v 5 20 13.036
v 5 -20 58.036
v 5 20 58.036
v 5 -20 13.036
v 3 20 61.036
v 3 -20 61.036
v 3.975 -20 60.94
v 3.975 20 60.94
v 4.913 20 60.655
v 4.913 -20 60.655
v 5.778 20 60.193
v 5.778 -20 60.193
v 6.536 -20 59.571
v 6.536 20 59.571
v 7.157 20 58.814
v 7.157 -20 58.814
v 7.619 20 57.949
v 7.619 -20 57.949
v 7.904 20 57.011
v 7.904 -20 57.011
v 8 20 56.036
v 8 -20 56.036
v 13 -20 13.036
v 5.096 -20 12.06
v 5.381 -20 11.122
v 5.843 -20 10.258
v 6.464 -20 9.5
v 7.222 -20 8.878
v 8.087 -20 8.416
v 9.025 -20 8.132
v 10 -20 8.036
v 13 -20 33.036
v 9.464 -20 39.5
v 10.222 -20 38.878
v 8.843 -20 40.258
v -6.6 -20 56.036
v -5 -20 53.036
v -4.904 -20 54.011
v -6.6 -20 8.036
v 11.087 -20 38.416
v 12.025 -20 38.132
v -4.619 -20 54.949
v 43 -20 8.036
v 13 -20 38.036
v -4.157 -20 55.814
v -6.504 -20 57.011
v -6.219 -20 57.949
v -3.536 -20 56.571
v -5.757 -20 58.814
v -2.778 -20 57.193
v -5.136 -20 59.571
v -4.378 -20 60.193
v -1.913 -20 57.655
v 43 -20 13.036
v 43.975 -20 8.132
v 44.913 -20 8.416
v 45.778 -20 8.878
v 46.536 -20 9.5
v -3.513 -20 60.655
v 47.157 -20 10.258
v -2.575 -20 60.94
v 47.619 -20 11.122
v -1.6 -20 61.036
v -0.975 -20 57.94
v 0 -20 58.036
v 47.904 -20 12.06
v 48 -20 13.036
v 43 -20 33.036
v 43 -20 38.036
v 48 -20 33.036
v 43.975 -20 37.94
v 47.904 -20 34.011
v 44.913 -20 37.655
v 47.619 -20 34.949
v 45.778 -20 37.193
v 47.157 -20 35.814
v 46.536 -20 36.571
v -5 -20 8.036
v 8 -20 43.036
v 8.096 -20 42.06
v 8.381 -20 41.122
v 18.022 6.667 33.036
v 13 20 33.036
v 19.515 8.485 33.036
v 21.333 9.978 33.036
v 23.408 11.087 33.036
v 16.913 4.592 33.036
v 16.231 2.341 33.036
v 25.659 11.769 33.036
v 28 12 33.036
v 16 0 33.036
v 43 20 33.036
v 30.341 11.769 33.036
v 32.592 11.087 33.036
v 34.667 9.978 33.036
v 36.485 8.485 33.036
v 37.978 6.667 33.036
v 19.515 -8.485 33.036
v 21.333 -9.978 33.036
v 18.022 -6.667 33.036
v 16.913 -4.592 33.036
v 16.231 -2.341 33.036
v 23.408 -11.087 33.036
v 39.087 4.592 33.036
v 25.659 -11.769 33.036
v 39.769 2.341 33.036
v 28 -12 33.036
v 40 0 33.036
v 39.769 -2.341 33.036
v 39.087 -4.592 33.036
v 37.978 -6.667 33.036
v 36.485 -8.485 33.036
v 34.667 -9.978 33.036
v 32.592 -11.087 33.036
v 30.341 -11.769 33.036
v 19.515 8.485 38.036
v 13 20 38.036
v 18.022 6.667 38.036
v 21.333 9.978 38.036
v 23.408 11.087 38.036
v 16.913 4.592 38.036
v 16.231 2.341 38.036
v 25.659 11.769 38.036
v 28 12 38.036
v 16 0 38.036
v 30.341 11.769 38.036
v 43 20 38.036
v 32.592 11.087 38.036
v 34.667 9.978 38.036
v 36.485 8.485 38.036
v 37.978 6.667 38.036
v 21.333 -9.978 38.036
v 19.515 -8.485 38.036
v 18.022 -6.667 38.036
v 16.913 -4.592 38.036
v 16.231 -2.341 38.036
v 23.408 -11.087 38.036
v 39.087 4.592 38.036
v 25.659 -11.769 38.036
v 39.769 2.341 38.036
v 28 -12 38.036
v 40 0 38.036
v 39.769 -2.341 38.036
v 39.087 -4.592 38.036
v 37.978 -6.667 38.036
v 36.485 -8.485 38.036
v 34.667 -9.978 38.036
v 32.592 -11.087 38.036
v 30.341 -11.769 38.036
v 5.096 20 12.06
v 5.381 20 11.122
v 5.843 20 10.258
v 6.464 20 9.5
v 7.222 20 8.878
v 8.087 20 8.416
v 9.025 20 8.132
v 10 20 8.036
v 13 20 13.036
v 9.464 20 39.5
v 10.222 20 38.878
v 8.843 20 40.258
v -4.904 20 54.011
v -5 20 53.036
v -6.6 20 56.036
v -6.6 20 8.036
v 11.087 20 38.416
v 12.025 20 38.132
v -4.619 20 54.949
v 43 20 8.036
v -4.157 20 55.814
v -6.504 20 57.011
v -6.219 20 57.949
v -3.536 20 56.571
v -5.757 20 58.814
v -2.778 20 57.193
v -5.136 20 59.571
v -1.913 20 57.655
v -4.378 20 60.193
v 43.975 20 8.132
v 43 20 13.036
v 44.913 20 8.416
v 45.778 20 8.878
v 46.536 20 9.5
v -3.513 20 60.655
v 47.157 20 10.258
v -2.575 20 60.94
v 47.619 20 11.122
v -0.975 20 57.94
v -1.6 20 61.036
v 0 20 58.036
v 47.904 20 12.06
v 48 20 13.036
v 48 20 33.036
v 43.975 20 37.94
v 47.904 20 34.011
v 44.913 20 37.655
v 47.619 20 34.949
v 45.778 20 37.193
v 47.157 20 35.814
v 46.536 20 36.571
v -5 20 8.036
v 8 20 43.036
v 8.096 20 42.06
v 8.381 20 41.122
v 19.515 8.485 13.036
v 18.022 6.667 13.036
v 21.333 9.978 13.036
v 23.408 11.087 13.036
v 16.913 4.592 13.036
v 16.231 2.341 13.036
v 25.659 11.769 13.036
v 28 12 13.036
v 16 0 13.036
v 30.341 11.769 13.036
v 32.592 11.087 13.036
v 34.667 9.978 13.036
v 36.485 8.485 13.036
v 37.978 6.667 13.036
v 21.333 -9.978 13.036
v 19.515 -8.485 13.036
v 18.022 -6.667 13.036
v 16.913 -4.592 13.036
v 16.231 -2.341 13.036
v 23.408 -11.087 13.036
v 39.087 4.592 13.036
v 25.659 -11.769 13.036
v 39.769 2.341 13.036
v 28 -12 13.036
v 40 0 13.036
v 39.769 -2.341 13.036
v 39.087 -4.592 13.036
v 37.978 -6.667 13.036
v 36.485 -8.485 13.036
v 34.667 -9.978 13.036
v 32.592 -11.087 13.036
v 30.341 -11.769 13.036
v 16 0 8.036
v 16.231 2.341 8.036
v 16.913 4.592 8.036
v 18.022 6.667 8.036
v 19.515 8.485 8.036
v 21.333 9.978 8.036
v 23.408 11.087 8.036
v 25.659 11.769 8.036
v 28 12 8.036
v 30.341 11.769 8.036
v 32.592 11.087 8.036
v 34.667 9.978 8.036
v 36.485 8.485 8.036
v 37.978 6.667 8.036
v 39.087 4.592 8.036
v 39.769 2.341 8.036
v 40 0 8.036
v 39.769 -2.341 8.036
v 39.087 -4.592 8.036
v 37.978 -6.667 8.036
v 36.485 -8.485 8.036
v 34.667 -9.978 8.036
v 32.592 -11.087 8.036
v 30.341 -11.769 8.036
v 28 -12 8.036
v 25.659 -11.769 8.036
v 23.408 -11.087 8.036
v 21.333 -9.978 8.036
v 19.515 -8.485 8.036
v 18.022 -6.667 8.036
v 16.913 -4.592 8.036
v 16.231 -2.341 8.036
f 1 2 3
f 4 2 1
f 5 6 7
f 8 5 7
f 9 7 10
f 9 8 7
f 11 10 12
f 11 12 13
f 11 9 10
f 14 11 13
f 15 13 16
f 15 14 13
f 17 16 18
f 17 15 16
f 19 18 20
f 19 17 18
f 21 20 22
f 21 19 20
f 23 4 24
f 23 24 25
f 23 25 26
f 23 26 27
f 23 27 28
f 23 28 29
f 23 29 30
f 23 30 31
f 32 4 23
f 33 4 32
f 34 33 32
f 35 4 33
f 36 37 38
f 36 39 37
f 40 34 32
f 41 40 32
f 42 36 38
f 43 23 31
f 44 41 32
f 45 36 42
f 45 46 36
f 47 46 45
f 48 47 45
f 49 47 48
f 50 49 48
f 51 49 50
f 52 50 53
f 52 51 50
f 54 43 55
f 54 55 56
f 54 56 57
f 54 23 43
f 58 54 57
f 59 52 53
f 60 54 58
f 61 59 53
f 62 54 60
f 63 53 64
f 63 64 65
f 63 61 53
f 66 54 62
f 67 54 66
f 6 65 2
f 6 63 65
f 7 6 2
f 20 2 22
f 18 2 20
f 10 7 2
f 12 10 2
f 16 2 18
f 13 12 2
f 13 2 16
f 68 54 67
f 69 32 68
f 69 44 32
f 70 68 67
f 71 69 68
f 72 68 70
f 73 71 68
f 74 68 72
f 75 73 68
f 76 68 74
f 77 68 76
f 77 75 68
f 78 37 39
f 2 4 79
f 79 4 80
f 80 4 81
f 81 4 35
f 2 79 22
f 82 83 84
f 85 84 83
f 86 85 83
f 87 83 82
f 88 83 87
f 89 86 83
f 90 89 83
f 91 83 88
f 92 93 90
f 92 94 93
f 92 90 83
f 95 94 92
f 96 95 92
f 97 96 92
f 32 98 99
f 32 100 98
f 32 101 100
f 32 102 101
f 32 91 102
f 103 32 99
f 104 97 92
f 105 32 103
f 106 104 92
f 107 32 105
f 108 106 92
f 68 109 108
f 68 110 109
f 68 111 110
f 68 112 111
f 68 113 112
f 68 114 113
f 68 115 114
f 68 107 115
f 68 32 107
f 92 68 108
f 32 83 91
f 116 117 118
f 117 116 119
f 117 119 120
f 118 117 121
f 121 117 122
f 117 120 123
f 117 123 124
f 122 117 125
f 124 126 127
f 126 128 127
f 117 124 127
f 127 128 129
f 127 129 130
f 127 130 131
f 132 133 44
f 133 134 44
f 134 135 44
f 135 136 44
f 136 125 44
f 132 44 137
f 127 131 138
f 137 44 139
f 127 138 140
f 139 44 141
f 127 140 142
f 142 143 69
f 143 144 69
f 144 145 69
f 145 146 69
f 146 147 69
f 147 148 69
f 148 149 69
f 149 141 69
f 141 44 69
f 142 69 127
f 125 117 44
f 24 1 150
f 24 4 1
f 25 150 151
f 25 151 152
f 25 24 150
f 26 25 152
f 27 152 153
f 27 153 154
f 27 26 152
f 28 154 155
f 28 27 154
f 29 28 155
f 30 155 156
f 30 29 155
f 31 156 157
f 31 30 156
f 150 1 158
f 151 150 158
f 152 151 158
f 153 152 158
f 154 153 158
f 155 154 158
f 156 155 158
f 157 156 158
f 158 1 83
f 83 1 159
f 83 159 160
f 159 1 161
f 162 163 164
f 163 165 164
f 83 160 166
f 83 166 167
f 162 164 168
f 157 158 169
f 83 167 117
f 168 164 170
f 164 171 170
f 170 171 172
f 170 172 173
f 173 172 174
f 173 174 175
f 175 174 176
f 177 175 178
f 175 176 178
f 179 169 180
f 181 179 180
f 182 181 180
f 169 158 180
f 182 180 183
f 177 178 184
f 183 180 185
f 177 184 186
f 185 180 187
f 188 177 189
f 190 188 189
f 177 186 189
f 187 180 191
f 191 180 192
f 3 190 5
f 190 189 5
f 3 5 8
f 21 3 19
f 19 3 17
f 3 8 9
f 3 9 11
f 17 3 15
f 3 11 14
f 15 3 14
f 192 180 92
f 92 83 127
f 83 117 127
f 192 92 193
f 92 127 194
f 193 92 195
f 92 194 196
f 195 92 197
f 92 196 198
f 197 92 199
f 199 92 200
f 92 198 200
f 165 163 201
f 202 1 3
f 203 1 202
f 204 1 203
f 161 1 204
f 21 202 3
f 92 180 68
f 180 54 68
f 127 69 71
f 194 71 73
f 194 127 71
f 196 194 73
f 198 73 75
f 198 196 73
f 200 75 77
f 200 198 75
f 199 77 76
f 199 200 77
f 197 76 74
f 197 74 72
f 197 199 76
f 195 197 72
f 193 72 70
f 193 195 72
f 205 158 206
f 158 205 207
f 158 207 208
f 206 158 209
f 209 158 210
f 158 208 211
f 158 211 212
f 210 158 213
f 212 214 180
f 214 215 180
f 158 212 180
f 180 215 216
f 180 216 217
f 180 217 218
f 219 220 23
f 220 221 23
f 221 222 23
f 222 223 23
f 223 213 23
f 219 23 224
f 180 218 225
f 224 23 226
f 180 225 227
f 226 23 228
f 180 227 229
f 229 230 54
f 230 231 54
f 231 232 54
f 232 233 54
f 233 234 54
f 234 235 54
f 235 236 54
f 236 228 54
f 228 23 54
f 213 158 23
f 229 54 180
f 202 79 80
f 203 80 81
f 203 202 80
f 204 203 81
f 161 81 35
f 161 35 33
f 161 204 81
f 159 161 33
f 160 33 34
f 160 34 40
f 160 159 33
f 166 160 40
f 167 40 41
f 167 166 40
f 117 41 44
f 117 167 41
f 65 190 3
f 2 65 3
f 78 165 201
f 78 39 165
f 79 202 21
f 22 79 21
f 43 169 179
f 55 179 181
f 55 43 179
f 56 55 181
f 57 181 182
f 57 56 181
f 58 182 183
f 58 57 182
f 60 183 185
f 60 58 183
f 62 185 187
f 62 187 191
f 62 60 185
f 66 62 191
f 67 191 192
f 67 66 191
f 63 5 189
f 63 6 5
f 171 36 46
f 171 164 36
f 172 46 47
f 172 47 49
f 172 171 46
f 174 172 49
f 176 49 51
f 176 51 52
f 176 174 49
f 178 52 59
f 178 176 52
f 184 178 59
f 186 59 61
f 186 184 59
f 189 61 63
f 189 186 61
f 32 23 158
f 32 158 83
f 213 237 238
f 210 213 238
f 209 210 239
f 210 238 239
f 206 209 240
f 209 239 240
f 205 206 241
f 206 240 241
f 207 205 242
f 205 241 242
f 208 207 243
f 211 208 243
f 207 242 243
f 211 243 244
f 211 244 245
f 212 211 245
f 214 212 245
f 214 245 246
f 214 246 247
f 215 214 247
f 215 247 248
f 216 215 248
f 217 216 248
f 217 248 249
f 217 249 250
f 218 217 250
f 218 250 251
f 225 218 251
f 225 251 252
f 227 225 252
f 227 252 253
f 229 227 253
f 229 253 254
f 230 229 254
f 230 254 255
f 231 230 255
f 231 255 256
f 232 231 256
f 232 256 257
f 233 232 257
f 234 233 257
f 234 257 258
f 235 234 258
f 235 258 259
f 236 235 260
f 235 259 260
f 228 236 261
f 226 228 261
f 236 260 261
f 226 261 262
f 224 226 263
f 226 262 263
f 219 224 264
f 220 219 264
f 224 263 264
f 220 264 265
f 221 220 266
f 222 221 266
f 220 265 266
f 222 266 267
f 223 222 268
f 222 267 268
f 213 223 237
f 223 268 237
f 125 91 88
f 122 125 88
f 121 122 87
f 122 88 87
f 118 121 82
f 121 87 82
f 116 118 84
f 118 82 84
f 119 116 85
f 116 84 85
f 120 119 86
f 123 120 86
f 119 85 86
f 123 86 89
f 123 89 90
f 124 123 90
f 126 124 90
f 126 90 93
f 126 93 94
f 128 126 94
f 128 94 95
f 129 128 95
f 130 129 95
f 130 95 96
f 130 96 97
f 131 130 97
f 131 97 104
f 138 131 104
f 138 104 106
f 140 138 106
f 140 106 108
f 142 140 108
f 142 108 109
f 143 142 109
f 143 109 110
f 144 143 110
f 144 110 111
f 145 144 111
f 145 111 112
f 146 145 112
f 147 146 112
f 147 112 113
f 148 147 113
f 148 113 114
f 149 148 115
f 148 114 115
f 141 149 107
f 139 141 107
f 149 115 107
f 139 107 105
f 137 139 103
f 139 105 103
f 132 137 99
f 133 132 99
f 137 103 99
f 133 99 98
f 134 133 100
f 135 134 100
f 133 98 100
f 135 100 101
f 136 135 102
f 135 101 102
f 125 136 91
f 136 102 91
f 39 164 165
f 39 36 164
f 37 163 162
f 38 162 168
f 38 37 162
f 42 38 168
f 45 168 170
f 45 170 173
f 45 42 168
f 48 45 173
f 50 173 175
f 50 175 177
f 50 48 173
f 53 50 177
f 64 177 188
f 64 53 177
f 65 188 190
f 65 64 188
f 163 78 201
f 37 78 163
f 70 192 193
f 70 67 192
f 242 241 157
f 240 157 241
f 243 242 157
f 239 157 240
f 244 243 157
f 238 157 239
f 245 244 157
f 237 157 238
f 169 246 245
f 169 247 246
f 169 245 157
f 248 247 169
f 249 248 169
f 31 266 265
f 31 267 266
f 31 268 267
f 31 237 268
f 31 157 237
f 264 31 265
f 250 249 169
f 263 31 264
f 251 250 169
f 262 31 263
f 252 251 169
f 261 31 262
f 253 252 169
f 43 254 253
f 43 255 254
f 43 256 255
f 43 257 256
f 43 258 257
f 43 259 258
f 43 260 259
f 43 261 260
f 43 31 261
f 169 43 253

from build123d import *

# Parameters (mm, degrees)
F0_W     = 1.6
F0_H     = 50
F0_W_2   = 40
F0_H_2   = 30
F0_W_3   = 30
F0_H_3   = 20
F1_DEPTH = 20
F3_D     = 24
F4_R     = 5


with BuildPart() as f1:
    # F0 (on Front) → F1 (new body, symmetric)
    with BuildSketch(Plane.XZ):
        with Locations((-5.8, 33.0357266191)):
            Rectangle(F0_W, F0_H)
        Polygon((-6.6, 58.0357266191), (-5, 58.0357266191), (5, 58.0357266191), (5, 61.0357266191), (-6.6, 61.0357266191), align=None)
        Polygon((5, 61.0357266191), (5, 58.0357266191), (5, 8.0357266191), (8, 8.0357266191), (8, 38.0357266191), (8, 61.0357266191), align=None)
        with Locations((28, 23.0357266191)):
            Rectangle(F0_W_2, F0_H_2)
        with Locations((28, 23.0357266191)):
            Rectangle(F0_W_3, F0_H_3, mode=Mode.SUBTRACT)
    extrude(amount=F1_DEPTH, both=True)

    # F3 (through all)
    with Locations(Plane.XY.offset(38.0357266191)):
        with Locations((28, 0)):
            Hole(F3_D / 2)

    # F4
    f4_edges = [f1.edges().sort_by_distance(p)[0] for p in [
        (-5, 0, 58.035727),
        (8, 0, 38.035727),
        (8, 0, 61.035727),
        (-6.6, 0, 61.035727),
        (48, 0, 38.035727),
        (48, 0, 8.035727),
        (5, 0, 8.035727),
    ]]
    fillet(f4_edges, radius=F4_R)


solid = f1.part
